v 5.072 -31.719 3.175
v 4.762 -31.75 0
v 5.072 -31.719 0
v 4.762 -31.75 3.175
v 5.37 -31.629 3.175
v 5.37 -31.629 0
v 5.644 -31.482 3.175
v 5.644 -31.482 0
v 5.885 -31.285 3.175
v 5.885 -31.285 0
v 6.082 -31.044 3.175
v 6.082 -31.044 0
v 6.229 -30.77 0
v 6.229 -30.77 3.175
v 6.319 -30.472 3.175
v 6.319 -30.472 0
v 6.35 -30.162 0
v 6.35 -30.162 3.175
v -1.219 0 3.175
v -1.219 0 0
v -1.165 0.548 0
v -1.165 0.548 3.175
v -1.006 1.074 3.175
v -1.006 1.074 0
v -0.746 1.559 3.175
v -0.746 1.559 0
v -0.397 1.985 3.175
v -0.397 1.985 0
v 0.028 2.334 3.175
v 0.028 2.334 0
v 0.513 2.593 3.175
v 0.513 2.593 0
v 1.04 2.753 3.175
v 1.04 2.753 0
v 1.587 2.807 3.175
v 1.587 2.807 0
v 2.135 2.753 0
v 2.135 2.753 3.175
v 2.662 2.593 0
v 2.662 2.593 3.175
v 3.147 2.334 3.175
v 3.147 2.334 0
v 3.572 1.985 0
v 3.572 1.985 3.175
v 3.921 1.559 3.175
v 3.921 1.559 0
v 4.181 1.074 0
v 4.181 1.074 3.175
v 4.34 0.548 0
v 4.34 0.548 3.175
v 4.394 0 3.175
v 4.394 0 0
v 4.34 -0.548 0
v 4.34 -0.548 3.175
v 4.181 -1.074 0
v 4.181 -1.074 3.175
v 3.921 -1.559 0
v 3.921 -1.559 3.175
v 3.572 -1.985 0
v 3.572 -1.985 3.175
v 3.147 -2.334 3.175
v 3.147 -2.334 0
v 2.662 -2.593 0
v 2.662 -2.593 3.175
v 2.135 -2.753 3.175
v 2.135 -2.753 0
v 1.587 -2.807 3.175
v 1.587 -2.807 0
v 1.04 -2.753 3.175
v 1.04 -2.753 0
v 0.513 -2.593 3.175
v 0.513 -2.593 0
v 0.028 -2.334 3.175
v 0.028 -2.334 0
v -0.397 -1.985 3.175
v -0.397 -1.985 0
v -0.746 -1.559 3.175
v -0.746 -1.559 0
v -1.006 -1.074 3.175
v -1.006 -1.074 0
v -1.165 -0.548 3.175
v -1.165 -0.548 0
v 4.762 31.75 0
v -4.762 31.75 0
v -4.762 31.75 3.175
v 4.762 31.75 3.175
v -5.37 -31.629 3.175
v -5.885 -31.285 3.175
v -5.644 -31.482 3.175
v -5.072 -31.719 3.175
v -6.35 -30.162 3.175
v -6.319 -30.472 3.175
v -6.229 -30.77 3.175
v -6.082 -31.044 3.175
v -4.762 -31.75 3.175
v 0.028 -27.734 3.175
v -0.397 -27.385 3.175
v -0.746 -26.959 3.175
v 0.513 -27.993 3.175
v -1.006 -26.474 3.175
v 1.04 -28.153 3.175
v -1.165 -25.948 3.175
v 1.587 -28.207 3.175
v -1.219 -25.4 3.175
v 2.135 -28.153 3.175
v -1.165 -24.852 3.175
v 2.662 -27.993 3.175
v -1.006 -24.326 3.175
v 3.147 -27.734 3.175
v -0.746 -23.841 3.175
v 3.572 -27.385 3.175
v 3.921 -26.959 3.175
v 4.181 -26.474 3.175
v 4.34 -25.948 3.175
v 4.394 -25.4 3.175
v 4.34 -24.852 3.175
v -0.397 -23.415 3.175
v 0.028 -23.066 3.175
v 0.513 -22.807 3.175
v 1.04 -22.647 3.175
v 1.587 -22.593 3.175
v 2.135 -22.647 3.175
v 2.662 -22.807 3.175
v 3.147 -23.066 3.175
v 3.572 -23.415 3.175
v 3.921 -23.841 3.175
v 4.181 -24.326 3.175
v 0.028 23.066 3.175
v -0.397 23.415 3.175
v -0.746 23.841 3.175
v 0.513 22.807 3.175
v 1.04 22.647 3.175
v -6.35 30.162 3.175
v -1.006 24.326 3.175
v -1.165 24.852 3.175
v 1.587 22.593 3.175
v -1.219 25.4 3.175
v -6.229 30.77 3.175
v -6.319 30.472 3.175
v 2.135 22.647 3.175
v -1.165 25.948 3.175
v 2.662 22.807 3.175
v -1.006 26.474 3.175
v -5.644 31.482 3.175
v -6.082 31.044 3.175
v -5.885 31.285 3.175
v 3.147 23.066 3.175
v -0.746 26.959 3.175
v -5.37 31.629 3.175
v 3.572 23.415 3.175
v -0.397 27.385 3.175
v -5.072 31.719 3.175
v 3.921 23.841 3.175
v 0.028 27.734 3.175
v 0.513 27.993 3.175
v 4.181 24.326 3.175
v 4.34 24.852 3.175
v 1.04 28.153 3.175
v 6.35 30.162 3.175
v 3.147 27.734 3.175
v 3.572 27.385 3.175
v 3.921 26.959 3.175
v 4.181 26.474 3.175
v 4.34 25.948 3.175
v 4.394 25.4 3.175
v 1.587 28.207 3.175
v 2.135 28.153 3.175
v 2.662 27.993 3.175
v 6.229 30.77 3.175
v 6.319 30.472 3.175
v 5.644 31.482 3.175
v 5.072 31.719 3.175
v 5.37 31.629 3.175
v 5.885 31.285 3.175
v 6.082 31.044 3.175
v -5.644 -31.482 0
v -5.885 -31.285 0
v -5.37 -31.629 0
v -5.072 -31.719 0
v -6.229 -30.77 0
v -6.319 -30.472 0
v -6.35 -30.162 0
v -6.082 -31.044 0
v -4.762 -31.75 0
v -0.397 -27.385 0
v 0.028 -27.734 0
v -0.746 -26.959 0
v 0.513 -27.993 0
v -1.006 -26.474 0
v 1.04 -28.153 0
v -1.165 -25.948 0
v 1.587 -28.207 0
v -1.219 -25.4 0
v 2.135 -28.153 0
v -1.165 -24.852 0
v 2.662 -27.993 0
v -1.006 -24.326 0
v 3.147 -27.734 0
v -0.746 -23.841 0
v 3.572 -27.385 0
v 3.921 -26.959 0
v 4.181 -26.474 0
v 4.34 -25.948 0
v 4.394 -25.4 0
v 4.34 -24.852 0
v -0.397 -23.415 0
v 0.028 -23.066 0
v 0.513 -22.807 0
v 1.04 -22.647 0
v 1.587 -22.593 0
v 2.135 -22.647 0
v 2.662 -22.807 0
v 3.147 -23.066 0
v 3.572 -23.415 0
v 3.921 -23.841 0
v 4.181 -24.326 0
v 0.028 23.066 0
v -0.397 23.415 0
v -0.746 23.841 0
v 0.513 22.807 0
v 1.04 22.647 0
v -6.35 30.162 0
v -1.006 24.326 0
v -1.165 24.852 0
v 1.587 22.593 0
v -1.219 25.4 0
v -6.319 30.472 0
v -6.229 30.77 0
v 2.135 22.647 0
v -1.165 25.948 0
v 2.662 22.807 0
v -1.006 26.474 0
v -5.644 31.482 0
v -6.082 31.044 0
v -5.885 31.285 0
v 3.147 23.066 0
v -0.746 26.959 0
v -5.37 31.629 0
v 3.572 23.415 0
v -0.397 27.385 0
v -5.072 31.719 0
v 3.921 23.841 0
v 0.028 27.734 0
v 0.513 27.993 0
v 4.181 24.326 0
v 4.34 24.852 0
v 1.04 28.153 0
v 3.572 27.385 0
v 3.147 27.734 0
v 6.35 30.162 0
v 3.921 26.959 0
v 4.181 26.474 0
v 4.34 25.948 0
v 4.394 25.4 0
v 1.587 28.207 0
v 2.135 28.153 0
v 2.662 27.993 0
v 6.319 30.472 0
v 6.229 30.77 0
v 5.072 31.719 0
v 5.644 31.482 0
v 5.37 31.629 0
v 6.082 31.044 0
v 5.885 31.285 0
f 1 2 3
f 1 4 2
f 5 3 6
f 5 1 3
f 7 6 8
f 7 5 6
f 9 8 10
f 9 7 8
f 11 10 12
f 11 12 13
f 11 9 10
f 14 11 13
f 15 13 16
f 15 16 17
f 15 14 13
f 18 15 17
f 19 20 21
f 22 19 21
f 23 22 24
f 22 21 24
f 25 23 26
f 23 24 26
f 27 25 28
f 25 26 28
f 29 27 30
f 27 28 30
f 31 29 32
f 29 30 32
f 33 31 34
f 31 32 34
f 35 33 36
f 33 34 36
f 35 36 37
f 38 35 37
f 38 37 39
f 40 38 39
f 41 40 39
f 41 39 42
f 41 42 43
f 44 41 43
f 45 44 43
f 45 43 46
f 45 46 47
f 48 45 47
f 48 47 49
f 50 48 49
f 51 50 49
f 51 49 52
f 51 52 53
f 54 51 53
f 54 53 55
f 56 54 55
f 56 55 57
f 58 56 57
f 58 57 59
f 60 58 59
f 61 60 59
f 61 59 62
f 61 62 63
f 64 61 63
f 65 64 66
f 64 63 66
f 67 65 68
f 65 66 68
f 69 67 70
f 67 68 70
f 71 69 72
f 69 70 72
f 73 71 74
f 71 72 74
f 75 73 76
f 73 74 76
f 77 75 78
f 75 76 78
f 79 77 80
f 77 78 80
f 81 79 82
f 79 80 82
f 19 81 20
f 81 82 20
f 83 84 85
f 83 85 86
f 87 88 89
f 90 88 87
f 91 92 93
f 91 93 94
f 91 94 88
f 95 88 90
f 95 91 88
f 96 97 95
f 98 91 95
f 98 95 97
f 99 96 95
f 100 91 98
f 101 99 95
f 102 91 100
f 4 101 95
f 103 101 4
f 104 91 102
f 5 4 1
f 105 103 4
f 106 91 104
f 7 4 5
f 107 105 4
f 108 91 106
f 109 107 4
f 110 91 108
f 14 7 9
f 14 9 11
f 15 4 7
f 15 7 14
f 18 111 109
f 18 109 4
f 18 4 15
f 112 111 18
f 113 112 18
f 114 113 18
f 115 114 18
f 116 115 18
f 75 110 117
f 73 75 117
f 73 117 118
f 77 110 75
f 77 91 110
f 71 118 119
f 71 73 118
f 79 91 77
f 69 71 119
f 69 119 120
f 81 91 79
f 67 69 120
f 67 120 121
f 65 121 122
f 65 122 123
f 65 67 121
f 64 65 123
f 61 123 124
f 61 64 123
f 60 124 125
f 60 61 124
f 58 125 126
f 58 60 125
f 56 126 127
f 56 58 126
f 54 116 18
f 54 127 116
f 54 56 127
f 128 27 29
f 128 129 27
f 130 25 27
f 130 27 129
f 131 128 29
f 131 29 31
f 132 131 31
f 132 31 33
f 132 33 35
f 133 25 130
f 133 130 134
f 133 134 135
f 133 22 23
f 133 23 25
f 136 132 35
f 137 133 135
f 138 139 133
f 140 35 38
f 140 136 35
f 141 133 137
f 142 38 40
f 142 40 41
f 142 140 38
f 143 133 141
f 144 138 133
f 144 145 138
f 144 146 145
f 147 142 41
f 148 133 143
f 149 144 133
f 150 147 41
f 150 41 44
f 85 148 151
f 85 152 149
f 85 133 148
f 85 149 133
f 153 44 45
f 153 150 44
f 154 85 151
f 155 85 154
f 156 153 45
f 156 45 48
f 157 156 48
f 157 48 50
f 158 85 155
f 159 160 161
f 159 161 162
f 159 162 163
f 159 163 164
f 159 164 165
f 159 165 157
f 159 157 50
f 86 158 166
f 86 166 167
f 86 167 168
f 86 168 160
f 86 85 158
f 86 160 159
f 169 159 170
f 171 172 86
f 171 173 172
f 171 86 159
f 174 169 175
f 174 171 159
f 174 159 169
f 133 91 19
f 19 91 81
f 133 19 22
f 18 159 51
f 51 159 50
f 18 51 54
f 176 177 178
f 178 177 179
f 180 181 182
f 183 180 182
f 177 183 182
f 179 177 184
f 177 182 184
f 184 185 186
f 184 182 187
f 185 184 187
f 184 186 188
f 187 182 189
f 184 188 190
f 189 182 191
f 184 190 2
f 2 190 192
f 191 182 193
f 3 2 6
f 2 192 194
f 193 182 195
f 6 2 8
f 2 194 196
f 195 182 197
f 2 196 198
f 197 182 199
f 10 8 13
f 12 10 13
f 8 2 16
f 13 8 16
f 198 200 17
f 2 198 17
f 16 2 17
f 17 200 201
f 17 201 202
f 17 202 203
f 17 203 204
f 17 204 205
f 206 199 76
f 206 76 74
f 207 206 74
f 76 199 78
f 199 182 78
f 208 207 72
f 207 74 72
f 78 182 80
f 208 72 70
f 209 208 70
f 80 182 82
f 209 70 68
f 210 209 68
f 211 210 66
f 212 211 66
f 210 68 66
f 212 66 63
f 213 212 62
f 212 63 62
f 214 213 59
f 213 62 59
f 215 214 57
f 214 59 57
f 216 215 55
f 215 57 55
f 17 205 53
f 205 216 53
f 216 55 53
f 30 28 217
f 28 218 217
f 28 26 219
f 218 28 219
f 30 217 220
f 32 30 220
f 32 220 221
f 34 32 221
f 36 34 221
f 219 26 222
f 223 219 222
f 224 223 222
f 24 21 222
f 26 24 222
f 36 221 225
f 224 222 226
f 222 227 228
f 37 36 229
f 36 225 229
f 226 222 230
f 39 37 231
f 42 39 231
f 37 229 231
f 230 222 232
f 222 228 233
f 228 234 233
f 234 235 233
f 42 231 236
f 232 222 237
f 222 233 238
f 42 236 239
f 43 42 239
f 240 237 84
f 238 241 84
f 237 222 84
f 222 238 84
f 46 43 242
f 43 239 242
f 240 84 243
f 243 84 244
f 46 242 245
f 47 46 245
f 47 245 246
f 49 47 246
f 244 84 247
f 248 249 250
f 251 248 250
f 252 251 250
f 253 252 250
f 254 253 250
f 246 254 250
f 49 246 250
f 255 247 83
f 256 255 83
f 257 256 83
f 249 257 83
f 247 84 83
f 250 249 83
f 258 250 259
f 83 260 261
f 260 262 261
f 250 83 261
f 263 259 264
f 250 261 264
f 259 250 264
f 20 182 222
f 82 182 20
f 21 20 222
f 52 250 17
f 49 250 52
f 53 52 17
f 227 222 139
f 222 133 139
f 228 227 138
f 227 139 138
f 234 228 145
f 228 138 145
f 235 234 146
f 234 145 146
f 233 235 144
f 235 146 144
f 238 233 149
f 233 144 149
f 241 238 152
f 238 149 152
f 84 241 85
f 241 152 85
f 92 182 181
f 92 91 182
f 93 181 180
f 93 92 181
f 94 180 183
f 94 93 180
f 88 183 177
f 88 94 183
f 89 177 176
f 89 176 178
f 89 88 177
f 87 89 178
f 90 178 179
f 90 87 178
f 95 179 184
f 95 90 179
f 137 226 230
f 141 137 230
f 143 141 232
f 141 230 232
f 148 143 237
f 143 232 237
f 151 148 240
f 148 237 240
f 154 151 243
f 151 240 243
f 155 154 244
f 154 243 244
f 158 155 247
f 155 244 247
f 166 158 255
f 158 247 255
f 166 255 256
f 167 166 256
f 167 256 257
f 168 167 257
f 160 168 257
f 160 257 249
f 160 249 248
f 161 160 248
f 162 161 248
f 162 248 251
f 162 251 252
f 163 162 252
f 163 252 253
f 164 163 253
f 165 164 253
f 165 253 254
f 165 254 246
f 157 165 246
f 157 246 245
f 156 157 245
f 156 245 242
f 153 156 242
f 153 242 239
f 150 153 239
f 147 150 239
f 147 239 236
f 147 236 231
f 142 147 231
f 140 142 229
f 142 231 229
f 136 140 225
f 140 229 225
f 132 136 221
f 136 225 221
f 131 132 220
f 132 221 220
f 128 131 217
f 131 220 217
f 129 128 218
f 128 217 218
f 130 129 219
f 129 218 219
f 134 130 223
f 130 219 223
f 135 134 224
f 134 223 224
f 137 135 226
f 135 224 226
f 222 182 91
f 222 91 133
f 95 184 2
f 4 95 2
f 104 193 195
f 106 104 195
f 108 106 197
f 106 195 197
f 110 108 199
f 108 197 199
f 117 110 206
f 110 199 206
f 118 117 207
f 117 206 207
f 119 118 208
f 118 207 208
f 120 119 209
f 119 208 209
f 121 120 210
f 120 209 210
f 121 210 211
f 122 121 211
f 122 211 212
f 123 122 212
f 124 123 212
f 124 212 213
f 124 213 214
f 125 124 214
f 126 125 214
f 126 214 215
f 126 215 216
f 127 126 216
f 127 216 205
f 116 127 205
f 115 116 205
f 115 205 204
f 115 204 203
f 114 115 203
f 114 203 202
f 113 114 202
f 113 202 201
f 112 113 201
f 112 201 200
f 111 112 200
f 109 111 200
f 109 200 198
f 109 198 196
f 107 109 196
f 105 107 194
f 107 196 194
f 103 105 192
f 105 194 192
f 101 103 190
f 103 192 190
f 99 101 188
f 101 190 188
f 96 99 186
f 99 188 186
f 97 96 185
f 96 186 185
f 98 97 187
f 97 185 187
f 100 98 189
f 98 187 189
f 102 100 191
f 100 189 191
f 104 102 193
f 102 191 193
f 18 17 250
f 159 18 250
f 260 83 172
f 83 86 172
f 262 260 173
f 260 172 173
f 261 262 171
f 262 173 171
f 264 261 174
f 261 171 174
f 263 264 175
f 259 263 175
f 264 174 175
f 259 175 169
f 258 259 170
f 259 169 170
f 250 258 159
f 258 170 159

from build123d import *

# Parameters (mm, degrees)
SKETCH1_W                  = 12.7
SKETCH1_H                  = 63.5
BOSS_EXTRUDE1_DEPTH        = 3.175
F_10_CLEARANCE_HOLE1_D     = 5.6134
F_10_CLEARANCE_HOLE1_DEPTH = 25.4
F_10_CLEARANCE_HOLE1_TIP   = 1.686435499
FILLET1_R                  = 1.5875


with BuildPart() as part:
    # Sketch1 → Boss-Extrude1 (new body)
    with BuildSketch(Plane.XY):
        Rectangle(SKETCH1_W, SKETCH1_H)
    extrude(amount=BOSS_EXTRUDE1_DEPTH)

    # #10 Clearance Hole1
    with Locations(Plane.XY.offset(3.175)):
        with Locations((1.5875, -25.4), (1.5875, 0), (1.5875, 25.4)):
            Hole(F_10_CLEARANCE_HOLE1_D / 2, depth=F_10_CLEARANCE_HOLE1_DEPTH)
            with Locations((0, 0, -(F_10_CLEARANCE_HOLE1_DEPTH + F_10_CLEARANCE_HOLE1_TIP / 2))):  # 118° drill point
                Cone(0, F_10_CLEARANCE_HOLE1_D / 2, F_10_CLEARANCE_HOLE1_TIP, mode=Mode.SUBTRACT)

    # Fillet1
    fillet1_edges = [part.edges().sort_by_distance(p)[0] for p in [
        (6.35, -31.75, 1.5875),
        (-6.35, -31.75, 1.5875),
        (-6.35, 31.75, 1.5875),
        (6.35, 31.75, 1.5875),
    ]]
    fillet(fillet1_edges, radius=FILLET1_R)


solid = part.part
